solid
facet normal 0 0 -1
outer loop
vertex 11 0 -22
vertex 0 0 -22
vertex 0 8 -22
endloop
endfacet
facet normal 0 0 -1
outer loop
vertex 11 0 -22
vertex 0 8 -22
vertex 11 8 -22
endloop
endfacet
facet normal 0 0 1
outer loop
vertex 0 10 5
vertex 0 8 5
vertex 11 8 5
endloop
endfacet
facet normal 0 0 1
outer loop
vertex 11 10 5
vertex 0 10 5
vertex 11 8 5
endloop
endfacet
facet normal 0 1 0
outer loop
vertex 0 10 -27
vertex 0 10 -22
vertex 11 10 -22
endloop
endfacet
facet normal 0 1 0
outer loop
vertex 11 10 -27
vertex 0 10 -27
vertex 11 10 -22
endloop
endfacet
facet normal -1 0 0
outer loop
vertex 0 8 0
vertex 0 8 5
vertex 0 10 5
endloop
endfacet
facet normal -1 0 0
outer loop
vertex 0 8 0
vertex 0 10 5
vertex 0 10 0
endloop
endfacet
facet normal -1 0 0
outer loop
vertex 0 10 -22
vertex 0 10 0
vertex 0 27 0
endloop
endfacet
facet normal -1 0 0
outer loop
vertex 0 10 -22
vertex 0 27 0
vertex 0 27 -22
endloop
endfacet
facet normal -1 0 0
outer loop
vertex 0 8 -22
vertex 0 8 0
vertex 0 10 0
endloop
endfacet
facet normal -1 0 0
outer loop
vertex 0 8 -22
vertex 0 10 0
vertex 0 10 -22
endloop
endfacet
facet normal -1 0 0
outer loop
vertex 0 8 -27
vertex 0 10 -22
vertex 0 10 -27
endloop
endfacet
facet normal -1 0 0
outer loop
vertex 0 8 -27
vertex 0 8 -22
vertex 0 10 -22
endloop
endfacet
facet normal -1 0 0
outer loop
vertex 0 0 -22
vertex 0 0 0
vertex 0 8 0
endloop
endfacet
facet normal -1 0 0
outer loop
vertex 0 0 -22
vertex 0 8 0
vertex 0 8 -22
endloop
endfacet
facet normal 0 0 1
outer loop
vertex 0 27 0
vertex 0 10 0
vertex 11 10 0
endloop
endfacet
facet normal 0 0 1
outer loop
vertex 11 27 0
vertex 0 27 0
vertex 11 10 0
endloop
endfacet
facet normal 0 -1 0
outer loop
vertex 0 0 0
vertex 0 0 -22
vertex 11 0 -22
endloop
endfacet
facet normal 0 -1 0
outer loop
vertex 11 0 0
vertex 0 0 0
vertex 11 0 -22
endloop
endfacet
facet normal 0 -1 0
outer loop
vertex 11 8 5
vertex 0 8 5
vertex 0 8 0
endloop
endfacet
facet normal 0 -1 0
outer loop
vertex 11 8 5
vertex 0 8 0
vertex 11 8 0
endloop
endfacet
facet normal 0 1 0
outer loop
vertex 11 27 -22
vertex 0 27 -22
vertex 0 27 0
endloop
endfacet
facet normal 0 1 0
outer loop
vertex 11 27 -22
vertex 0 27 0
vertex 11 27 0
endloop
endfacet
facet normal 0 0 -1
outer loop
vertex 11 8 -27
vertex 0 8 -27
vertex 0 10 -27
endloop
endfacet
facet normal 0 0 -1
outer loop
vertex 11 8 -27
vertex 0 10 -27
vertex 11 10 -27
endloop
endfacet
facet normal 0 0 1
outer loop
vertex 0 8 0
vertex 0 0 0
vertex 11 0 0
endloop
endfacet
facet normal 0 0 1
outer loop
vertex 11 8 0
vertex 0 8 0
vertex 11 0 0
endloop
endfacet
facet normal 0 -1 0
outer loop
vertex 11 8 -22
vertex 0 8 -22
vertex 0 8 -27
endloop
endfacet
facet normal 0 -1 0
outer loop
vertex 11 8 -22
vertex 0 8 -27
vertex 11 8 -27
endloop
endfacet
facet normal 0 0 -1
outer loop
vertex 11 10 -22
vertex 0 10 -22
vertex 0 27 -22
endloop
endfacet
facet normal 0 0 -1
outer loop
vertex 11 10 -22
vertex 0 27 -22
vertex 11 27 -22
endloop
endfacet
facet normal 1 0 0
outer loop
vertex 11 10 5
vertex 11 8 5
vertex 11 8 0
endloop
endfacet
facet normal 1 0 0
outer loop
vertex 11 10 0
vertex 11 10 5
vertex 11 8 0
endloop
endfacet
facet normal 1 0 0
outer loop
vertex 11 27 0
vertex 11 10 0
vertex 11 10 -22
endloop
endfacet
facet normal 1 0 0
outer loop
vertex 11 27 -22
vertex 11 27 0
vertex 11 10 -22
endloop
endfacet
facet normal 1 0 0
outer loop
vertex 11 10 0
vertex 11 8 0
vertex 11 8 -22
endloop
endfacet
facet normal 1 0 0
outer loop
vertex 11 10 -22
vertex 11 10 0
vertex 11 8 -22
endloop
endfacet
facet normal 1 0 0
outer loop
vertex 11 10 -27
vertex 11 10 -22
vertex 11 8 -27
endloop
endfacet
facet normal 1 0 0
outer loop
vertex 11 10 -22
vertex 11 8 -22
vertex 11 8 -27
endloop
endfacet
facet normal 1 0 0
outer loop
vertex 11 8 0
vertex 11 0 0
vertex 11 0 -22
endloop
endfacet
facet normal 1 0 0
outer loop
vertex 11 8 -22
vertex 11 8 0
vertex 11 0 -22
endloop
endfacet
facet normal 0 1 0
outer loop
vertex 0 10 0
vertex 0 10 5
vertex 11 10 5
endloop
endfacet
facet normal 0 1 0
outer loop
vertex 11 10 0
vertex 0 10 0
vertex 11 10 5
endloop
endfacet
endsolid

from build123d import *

# Parameters (mm, degrees)
SKETCH1_W           = 11
SKETCH1_H           = 22
BOSS_EXTRUDE1_DEPTH = 27
BOSS_EXTRUDE2_START = -8
SKETCH2_W           = 11
SKETCH2_H           = 5
BOSS_EXTRUDE2_DEPTH = 2


with BuildPart() as part:
    # Sketch1 → Boss-Extrude1 (new body)
    with BuildSketch(Plane(origin=(0, 0, 0), x_dir=(1, 0, 0), z_dir=(0, 1, 0))):
        with Locations((5.5, 11)):
            Rectangle(SKETCH1_W, SKETCH1_H)
    extrude(amount=BOSS_EXTRUDE1_DEPTH)

    # Sketch2 → Boss-Extrude2 (add)
    with BuildSketch(Plane.XZ.offset(BOSS_EXTRUDE2_START)):
        with Locations((5.5, 2.5)):
            Rectangle(SKETCH2_W, SKETCH2_H)
        with Locations((5.5, -24.5)):
            Rectangle(SKETCH2_W, SKETCH2_H)
    extrude(amount=-BOSS_EXTRUDE2_DEPTH)


solid = part.part
